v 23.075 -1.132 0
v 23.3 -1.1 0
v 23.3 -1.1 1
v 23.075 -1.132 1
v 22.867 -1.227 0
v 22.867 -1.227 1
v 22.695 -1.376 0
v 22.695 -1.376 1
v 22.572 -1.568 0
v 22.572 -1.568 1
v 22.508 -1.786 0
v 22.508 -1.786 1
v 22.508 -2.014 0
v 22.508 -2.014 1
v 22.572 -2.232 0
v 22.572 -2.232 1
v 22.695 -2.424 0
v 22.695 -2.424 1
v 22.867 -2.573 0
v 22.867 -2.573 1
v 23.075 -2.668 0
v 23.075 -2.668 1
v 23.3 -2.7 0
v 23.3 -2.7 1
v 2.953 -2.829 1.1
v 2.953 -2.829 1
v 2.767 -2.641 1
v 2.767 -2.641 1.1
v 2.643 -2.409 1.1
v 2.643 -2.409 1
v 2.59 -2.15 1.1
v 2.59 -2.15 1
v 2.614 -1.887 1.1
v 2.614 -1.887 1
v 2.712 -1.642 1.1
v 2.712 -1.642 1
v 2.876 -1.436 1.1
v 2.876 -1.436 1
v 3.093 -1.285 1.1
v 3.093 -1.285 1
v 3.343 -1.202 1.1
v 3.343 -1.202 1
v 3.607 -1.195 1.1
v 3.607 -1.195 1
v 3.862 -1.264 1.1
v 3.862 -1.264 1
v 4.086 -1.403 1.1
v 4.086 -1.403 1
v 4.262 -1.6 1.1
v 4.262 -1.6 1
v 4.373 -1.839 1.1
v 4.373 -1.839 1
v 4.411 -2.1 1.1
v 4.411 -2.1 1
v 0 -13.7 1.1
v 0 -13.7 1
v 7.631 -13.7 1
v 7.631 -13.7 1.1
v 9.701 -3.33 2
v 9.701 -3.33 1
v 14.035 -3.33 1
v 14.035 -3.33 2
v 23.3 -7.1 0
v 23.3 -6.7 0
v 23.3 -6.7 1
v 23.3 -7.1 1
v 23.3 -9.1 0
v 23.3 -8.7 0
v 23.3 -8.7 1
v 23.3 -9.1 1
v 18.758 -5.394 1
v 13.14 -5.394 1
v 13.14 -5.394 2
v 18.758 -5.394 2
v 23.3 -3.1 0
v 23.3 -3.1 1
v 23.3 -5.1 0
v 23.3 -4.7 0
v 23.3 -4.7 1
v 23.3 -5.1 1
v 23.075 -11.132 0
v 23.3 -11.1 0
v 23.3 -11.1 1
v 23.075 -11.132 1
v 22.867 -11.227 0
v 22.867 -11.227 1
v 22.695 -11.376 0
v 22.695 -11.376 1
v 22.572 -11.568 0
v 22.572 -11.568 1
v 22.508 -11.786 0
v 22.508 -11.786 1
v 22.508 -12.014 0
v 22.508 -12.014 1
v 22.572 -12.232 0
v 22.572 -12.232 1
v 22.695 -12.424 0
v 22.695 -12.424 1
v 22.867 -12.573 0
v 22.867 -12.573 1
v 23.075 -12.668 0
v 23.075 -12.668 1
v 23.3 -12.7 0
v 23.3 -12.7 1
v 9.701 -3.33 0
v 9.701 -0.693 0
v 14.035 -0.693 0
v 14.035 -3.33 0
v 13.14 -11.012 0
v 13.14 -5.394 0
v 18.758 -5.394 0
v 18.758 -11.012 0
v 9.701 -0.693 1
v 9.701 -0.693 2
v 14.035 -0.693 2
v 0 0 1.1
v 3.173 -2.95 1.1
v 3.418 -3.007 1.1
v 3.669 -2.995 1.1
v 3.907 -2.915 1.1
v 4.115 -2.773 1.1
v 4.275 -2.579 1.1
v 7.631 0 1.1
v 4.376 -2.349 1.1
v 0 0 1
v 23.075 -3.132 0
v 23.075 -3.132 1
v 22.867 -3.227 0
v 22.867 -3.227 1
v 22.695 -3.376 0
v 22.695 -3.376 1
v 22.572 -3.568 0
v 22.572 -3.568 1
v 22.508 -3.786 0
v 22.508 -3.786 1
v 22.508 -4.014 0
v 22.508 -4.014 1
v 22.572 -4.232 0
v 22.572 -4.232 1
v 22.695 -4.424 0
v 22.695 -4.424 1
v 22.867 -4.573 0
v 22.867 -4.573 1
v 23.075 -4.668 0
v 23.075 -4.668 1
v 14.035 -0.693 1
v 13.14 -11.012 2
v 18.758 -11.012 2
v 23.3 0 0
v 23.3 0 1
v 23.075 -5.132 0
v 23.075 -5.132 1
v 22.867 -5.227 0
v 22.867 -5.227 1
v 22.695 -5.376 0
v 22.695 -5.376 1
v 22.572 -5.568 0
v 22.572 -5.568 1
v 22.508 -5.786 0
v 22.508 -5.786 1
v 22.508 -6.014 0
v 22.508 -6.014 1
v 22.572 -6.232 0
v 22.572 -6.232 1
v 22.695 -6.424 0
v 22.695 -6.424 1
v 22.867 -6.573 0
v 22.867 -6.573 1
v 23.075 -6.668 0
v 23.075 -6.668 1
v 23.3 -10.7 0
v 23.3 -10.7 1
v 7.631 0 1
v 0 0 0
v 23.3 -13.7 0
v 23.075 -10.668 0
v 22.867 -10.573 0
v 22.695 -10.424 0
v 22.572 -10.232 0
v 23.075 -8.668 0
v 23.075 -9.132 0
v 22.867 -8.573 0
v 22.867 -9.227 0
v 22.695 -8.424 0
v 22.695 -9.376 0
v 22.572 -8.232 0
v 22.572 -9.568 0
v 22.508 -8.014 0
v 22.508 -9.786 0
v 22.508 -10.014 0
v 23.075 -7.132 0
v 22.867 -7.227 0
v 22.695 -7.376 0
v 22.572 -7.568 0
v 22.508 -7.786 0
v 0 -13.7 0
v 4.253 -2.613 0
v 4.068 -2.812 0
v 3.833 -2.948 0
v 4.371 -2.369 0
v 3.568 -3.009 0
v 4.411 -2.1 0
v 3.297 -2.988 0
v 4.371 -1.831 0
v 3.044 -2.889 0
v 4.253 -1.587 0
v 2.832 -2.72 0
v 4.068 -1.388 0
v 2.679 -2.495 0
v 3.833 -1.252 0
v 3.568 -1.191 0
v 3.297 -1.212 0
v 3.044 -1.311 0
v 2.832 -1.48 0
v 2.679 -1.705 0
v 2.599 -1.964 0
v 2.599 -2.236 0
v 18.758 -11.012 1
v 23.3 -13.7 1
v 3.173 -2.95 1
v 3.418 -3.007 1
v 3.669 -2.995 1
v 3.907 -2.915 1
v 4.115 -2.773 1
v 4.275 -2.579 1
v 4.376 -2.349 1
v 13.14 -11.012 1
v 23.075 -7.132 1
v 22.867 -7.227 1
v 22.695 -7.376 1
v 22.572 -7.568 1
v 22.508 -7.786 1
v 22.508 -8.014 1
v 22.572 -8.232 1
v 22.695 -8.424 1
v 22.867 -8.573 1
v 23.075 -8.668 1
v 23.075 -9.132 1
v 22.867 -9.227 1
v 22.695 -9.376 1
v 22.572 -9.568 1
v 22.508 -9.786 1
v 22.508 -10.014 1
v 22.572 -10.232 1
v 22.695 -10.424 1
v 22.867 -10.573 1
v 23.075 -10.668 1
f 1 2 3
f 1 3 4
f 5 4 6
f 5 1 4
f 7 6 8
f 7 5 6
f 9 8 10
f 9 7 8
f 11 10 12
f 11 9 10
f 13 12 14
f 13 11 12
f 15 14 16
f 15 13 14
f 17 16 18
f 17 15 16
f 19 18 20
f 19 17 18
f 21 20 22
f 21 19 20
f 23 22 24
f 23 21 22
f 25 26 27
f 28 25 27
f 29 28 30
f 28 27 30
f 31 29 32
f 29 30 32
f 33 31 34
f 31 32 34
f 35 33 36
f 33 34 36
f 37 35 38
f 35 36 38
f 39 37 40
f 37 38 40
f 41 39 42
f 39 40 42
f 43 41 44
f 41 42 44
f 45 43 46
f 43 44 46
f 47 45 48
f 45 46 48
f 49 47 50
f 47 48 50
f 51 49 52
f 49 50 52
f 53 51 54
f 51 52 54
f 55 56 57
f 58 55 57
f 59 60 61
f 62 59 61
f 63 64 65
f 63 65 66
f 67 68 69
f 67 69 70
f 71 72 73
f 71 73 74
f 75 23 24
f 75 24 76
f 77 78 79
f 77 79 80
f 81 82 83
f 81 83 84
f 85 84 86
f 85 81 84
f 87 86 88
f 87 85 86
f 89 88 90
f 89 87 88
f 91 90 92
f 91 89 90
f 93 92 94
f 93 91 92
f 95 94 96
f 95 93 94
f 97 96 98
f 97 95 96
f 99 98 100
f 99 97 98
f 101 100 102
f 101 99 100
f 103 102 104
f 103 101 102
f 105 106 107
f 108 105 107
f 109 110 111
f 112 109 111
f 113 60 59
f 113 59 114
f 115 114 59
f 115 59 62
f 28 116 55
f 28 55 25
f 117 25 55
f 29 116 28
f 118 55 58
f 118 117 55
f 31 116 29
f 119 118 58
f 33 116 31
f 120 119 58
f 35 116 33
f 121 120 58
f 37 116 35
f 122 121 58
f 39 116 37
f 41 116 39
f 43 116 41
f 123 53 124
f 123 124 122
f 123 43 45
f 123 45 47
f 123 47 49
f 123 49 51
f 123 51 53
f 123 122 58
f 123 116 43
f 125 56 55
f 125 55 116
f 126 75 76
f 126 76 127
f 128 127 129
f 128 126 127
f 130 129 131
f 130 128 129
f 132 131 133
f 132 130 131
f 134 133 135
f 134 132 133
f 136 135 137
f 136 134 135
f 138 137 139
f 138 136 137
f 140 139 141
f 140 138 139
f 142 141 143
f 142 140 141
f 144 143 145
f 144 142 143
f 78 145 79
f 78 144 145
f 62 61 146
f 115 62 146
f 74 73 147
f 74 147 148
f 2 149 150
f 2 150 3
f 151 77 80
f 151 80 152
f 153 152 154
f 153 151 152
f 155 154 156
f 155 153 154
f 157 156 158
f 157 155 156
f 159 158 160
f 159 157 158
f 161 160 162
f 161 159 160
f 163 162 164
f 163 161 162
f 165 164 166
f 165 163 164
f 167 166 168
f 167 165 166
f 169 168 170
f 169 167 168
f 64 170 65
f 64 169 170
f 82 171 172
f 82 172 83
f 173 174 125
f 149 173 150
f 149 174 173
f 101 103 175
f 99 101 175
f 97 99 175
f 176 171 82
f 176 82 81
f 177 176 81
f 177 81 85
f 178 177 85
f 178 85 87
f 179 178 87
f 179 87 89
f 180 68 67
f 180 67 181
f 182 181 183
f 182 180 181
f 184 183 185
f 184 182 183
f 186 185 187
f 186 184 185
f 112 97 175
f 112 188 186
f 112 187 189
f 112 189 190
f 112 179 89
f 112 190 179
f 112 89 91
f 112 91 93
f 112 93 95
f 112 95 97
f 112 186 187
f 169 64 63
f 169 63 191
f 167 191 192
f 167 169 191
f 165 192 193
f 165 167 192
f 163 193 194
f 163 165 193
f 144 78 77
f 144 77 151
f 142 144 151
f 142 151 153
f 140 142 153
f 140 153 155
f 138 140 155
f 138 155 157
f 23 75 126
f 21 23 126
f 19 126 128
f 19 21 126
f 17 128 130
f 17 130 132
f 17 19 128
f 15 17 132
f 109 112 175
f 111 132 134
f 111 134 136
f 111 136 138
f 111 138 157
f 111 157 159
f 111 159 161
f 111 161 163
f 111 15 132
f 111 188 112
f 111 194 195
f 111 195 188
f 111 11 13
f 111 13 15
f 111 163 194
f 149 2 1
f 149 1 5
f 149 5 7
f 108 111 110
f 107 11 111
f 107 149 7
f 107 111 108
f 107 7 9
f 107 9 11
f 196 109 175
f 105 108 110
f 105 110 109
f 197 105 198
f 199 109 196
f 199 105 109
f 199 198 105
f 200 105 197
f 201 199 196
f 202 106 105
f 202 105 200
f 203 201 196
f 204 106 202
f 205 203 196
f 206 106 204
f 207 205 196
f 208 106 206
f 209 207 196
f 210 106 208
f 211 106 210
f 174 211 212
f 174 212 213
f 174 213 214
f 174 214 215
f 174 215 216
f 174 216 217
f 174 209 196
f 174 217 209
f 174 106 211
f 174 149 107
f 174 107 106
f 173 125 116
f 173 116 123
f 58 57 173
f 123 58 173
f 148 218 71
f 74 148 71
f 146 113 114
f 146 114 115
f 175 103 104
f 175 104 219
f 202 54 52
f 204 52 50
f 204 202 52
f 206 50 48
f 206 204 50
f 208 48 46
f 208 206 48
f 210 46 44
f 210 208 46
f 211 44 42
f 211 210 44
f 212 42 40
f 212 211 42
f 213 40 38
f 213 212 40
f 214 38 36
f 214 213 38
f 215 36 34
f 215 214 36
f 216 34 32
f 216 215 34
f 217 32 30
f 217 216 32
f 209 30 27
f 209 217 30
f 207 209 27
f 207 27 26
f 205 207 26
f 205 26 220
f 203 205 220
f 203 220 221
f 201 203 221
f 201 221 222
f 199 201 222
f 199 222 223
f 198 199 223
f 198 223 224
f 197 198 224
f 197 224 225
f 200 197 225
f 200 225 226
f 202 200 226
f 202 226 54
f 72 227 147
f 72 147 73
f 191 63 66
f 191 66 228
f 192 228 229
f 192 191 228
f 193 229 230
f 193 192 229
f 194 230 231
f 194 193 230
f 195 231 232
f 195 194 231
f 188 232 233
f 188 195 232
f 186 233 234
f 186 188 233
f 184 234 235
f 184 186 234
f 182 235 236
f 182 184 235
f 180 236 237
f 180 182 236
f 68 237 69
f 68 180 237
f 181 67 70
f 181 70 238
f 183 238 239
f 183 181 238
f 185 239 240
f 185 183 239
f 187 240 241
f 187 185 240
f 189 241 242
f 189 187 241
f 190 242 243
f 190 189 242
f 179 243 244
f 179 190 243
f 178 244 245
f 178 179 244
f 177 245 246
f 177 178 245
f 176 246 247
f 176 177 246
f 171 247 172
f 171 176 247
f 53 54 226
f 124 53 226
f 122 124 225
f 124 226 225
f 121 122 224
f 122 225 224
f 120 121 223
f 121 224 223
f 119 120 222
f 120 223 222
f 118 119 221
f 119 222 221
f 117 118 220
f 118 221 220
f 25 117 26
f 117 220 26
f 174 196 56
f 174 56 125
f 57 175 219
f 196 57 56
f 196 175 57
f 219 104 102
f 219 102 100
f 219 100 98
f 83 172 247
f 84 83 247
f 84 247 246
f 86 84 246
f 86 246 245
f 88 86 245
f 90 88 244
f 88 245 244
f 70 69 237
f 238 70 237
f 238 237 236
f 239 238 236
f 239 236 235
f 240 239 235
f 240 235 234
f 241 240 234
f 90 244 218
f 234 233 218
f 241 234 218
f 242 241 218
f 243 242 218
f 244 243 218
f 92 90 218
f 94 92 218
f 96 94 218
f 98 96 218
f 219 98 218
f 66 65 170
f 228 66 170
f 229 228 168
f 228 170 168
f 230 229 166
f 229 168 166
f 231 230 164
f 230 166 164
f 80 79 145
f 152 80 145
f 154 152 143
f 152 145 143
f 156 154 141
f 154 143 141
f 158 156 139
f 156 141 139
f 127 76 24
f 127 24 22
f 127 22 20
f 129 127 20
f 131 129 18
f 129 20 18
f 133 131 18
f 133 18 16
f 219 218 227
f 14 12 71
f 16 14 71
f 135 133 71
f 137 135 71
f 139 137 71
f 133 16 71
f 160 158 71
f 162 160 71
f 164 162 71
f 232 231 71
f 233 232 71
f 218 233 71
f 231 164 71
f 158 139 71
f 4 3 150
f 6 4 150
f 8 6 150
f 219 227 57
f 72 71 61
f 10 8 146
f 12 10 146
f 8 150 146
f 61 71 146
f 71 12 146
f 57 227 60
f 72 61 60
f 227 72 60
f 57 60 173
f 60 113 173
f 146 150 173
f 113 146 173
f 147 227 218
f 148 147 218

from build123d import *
from build123d.topology import SkipClean

# Parameters (mm, degrees)
SKETCH1_R           = 0.911145061
BOSS_EXTRUDE1_DEPTH = 1
SKETCH2_W           = 7.631466846
SKETCH2_H           = 13.7
BOSS_EXTRUDE2_DEPTH = 0.1
SKETCH3_W           = 5.617836281
SKETCH3_H           = 5.617836281
SKETCH3_W_2         = 4.333759416
SKETCH3_H_2         = 2.636943561
BOSS_EXTRUDE3_DEPTH = 2


with BuildPart() as part:
    # Sketch1 → Boss-Extrude1 (new body)
    with BuildSketch(Plane.XY):
        with BuildLine():
            Line((23.3, -2.7), (23.3, -3.1))
            ThreePointArc((23.3, -3.1), (22.5, -3.9), (23.3, -4.7))
            Line((23.3, -4.7), (23.3, -5.1))
            ThreePointArc((23.3, -5.1), (22.5, -5.9), (23.3, -6.7))
            Line((23.3, -6.7), (23.3, -7.1))
            ThreePointArc((23.3, -7.1), (22.5, -7.9), (23.3, -8.7))
            Line((23.3, -8.7), (23.3, -9.1))
            ThreePointArc((23.3, -9.1), (22.5, -9.9), (23.3, -10.7))
            Line((23.3, -10.7), (23.3, -11.1))
            ThreePointArc((23.3, -11.1), (22.5, -11.9), (23.3, -12.7))
            Line((23.3, -12.7), (23.3, -13.7))
            Line((23.3, -13.7), (0, -13.7))
            Line((0, -13.7), (0, 0))
            Line((0, 0), (23.3, 0))
            Line((23.3, 0), (23.3, -1.1))
            ThreePointArc((23.3, -1.1), (22.5, -1.9), (23.3, -2.7))
        make_face()
        with Locations((3.5, -2.1)):
            Circle(SKETCH1_R, mode=Mode.SUBTRACT)
    extrude(amount=BOSS_EXTRUDE1_DEPTH)

    # Sketch2 → Boss-Extrude2 (add)
    with SkipClean():  # the faces are left unmerged after this step: merging them gives an invalid solid
        with BuildSketch(Plane.XY.offset(1)):
            with Locations((3.815733423, -6.85)):
                Rectangle(SKETCH2_W, SKETCH2_H)
            with BuildLine():
                ThreePointArc((2.952848723, -2.828567637), (3.092783142, -1.284917334), (4.411145061, -2.1))
                ThreePointArc((4.411145061, -2.1), (3.907216858, -2.915082666), (2.952848723, -2.828567637))
            make_face(mode=Mode.SUBTRACT)
        extrude(amount=BOSS_EXTRUDE2_DEPTH)

    # Sketch3 → Boss-Extrude3 (add)
    with SkipClean():  # the faces are left unmerged after this step: merging them gives an invalid solid
        with BuildSketch(Plane.XY):
            with Locations((15.9493645, -8.202866697)):
                Rectangle(SKETCH3_W, SKETCH3_H)
            with Locations((11.867834468, -2.011781816)):
                Rectangle(SKETCH3_W_2, SKETCH3_H_2)
        extrude(amount=BOSS_EXTRUDE3_DEPTH)


solid = part.part
